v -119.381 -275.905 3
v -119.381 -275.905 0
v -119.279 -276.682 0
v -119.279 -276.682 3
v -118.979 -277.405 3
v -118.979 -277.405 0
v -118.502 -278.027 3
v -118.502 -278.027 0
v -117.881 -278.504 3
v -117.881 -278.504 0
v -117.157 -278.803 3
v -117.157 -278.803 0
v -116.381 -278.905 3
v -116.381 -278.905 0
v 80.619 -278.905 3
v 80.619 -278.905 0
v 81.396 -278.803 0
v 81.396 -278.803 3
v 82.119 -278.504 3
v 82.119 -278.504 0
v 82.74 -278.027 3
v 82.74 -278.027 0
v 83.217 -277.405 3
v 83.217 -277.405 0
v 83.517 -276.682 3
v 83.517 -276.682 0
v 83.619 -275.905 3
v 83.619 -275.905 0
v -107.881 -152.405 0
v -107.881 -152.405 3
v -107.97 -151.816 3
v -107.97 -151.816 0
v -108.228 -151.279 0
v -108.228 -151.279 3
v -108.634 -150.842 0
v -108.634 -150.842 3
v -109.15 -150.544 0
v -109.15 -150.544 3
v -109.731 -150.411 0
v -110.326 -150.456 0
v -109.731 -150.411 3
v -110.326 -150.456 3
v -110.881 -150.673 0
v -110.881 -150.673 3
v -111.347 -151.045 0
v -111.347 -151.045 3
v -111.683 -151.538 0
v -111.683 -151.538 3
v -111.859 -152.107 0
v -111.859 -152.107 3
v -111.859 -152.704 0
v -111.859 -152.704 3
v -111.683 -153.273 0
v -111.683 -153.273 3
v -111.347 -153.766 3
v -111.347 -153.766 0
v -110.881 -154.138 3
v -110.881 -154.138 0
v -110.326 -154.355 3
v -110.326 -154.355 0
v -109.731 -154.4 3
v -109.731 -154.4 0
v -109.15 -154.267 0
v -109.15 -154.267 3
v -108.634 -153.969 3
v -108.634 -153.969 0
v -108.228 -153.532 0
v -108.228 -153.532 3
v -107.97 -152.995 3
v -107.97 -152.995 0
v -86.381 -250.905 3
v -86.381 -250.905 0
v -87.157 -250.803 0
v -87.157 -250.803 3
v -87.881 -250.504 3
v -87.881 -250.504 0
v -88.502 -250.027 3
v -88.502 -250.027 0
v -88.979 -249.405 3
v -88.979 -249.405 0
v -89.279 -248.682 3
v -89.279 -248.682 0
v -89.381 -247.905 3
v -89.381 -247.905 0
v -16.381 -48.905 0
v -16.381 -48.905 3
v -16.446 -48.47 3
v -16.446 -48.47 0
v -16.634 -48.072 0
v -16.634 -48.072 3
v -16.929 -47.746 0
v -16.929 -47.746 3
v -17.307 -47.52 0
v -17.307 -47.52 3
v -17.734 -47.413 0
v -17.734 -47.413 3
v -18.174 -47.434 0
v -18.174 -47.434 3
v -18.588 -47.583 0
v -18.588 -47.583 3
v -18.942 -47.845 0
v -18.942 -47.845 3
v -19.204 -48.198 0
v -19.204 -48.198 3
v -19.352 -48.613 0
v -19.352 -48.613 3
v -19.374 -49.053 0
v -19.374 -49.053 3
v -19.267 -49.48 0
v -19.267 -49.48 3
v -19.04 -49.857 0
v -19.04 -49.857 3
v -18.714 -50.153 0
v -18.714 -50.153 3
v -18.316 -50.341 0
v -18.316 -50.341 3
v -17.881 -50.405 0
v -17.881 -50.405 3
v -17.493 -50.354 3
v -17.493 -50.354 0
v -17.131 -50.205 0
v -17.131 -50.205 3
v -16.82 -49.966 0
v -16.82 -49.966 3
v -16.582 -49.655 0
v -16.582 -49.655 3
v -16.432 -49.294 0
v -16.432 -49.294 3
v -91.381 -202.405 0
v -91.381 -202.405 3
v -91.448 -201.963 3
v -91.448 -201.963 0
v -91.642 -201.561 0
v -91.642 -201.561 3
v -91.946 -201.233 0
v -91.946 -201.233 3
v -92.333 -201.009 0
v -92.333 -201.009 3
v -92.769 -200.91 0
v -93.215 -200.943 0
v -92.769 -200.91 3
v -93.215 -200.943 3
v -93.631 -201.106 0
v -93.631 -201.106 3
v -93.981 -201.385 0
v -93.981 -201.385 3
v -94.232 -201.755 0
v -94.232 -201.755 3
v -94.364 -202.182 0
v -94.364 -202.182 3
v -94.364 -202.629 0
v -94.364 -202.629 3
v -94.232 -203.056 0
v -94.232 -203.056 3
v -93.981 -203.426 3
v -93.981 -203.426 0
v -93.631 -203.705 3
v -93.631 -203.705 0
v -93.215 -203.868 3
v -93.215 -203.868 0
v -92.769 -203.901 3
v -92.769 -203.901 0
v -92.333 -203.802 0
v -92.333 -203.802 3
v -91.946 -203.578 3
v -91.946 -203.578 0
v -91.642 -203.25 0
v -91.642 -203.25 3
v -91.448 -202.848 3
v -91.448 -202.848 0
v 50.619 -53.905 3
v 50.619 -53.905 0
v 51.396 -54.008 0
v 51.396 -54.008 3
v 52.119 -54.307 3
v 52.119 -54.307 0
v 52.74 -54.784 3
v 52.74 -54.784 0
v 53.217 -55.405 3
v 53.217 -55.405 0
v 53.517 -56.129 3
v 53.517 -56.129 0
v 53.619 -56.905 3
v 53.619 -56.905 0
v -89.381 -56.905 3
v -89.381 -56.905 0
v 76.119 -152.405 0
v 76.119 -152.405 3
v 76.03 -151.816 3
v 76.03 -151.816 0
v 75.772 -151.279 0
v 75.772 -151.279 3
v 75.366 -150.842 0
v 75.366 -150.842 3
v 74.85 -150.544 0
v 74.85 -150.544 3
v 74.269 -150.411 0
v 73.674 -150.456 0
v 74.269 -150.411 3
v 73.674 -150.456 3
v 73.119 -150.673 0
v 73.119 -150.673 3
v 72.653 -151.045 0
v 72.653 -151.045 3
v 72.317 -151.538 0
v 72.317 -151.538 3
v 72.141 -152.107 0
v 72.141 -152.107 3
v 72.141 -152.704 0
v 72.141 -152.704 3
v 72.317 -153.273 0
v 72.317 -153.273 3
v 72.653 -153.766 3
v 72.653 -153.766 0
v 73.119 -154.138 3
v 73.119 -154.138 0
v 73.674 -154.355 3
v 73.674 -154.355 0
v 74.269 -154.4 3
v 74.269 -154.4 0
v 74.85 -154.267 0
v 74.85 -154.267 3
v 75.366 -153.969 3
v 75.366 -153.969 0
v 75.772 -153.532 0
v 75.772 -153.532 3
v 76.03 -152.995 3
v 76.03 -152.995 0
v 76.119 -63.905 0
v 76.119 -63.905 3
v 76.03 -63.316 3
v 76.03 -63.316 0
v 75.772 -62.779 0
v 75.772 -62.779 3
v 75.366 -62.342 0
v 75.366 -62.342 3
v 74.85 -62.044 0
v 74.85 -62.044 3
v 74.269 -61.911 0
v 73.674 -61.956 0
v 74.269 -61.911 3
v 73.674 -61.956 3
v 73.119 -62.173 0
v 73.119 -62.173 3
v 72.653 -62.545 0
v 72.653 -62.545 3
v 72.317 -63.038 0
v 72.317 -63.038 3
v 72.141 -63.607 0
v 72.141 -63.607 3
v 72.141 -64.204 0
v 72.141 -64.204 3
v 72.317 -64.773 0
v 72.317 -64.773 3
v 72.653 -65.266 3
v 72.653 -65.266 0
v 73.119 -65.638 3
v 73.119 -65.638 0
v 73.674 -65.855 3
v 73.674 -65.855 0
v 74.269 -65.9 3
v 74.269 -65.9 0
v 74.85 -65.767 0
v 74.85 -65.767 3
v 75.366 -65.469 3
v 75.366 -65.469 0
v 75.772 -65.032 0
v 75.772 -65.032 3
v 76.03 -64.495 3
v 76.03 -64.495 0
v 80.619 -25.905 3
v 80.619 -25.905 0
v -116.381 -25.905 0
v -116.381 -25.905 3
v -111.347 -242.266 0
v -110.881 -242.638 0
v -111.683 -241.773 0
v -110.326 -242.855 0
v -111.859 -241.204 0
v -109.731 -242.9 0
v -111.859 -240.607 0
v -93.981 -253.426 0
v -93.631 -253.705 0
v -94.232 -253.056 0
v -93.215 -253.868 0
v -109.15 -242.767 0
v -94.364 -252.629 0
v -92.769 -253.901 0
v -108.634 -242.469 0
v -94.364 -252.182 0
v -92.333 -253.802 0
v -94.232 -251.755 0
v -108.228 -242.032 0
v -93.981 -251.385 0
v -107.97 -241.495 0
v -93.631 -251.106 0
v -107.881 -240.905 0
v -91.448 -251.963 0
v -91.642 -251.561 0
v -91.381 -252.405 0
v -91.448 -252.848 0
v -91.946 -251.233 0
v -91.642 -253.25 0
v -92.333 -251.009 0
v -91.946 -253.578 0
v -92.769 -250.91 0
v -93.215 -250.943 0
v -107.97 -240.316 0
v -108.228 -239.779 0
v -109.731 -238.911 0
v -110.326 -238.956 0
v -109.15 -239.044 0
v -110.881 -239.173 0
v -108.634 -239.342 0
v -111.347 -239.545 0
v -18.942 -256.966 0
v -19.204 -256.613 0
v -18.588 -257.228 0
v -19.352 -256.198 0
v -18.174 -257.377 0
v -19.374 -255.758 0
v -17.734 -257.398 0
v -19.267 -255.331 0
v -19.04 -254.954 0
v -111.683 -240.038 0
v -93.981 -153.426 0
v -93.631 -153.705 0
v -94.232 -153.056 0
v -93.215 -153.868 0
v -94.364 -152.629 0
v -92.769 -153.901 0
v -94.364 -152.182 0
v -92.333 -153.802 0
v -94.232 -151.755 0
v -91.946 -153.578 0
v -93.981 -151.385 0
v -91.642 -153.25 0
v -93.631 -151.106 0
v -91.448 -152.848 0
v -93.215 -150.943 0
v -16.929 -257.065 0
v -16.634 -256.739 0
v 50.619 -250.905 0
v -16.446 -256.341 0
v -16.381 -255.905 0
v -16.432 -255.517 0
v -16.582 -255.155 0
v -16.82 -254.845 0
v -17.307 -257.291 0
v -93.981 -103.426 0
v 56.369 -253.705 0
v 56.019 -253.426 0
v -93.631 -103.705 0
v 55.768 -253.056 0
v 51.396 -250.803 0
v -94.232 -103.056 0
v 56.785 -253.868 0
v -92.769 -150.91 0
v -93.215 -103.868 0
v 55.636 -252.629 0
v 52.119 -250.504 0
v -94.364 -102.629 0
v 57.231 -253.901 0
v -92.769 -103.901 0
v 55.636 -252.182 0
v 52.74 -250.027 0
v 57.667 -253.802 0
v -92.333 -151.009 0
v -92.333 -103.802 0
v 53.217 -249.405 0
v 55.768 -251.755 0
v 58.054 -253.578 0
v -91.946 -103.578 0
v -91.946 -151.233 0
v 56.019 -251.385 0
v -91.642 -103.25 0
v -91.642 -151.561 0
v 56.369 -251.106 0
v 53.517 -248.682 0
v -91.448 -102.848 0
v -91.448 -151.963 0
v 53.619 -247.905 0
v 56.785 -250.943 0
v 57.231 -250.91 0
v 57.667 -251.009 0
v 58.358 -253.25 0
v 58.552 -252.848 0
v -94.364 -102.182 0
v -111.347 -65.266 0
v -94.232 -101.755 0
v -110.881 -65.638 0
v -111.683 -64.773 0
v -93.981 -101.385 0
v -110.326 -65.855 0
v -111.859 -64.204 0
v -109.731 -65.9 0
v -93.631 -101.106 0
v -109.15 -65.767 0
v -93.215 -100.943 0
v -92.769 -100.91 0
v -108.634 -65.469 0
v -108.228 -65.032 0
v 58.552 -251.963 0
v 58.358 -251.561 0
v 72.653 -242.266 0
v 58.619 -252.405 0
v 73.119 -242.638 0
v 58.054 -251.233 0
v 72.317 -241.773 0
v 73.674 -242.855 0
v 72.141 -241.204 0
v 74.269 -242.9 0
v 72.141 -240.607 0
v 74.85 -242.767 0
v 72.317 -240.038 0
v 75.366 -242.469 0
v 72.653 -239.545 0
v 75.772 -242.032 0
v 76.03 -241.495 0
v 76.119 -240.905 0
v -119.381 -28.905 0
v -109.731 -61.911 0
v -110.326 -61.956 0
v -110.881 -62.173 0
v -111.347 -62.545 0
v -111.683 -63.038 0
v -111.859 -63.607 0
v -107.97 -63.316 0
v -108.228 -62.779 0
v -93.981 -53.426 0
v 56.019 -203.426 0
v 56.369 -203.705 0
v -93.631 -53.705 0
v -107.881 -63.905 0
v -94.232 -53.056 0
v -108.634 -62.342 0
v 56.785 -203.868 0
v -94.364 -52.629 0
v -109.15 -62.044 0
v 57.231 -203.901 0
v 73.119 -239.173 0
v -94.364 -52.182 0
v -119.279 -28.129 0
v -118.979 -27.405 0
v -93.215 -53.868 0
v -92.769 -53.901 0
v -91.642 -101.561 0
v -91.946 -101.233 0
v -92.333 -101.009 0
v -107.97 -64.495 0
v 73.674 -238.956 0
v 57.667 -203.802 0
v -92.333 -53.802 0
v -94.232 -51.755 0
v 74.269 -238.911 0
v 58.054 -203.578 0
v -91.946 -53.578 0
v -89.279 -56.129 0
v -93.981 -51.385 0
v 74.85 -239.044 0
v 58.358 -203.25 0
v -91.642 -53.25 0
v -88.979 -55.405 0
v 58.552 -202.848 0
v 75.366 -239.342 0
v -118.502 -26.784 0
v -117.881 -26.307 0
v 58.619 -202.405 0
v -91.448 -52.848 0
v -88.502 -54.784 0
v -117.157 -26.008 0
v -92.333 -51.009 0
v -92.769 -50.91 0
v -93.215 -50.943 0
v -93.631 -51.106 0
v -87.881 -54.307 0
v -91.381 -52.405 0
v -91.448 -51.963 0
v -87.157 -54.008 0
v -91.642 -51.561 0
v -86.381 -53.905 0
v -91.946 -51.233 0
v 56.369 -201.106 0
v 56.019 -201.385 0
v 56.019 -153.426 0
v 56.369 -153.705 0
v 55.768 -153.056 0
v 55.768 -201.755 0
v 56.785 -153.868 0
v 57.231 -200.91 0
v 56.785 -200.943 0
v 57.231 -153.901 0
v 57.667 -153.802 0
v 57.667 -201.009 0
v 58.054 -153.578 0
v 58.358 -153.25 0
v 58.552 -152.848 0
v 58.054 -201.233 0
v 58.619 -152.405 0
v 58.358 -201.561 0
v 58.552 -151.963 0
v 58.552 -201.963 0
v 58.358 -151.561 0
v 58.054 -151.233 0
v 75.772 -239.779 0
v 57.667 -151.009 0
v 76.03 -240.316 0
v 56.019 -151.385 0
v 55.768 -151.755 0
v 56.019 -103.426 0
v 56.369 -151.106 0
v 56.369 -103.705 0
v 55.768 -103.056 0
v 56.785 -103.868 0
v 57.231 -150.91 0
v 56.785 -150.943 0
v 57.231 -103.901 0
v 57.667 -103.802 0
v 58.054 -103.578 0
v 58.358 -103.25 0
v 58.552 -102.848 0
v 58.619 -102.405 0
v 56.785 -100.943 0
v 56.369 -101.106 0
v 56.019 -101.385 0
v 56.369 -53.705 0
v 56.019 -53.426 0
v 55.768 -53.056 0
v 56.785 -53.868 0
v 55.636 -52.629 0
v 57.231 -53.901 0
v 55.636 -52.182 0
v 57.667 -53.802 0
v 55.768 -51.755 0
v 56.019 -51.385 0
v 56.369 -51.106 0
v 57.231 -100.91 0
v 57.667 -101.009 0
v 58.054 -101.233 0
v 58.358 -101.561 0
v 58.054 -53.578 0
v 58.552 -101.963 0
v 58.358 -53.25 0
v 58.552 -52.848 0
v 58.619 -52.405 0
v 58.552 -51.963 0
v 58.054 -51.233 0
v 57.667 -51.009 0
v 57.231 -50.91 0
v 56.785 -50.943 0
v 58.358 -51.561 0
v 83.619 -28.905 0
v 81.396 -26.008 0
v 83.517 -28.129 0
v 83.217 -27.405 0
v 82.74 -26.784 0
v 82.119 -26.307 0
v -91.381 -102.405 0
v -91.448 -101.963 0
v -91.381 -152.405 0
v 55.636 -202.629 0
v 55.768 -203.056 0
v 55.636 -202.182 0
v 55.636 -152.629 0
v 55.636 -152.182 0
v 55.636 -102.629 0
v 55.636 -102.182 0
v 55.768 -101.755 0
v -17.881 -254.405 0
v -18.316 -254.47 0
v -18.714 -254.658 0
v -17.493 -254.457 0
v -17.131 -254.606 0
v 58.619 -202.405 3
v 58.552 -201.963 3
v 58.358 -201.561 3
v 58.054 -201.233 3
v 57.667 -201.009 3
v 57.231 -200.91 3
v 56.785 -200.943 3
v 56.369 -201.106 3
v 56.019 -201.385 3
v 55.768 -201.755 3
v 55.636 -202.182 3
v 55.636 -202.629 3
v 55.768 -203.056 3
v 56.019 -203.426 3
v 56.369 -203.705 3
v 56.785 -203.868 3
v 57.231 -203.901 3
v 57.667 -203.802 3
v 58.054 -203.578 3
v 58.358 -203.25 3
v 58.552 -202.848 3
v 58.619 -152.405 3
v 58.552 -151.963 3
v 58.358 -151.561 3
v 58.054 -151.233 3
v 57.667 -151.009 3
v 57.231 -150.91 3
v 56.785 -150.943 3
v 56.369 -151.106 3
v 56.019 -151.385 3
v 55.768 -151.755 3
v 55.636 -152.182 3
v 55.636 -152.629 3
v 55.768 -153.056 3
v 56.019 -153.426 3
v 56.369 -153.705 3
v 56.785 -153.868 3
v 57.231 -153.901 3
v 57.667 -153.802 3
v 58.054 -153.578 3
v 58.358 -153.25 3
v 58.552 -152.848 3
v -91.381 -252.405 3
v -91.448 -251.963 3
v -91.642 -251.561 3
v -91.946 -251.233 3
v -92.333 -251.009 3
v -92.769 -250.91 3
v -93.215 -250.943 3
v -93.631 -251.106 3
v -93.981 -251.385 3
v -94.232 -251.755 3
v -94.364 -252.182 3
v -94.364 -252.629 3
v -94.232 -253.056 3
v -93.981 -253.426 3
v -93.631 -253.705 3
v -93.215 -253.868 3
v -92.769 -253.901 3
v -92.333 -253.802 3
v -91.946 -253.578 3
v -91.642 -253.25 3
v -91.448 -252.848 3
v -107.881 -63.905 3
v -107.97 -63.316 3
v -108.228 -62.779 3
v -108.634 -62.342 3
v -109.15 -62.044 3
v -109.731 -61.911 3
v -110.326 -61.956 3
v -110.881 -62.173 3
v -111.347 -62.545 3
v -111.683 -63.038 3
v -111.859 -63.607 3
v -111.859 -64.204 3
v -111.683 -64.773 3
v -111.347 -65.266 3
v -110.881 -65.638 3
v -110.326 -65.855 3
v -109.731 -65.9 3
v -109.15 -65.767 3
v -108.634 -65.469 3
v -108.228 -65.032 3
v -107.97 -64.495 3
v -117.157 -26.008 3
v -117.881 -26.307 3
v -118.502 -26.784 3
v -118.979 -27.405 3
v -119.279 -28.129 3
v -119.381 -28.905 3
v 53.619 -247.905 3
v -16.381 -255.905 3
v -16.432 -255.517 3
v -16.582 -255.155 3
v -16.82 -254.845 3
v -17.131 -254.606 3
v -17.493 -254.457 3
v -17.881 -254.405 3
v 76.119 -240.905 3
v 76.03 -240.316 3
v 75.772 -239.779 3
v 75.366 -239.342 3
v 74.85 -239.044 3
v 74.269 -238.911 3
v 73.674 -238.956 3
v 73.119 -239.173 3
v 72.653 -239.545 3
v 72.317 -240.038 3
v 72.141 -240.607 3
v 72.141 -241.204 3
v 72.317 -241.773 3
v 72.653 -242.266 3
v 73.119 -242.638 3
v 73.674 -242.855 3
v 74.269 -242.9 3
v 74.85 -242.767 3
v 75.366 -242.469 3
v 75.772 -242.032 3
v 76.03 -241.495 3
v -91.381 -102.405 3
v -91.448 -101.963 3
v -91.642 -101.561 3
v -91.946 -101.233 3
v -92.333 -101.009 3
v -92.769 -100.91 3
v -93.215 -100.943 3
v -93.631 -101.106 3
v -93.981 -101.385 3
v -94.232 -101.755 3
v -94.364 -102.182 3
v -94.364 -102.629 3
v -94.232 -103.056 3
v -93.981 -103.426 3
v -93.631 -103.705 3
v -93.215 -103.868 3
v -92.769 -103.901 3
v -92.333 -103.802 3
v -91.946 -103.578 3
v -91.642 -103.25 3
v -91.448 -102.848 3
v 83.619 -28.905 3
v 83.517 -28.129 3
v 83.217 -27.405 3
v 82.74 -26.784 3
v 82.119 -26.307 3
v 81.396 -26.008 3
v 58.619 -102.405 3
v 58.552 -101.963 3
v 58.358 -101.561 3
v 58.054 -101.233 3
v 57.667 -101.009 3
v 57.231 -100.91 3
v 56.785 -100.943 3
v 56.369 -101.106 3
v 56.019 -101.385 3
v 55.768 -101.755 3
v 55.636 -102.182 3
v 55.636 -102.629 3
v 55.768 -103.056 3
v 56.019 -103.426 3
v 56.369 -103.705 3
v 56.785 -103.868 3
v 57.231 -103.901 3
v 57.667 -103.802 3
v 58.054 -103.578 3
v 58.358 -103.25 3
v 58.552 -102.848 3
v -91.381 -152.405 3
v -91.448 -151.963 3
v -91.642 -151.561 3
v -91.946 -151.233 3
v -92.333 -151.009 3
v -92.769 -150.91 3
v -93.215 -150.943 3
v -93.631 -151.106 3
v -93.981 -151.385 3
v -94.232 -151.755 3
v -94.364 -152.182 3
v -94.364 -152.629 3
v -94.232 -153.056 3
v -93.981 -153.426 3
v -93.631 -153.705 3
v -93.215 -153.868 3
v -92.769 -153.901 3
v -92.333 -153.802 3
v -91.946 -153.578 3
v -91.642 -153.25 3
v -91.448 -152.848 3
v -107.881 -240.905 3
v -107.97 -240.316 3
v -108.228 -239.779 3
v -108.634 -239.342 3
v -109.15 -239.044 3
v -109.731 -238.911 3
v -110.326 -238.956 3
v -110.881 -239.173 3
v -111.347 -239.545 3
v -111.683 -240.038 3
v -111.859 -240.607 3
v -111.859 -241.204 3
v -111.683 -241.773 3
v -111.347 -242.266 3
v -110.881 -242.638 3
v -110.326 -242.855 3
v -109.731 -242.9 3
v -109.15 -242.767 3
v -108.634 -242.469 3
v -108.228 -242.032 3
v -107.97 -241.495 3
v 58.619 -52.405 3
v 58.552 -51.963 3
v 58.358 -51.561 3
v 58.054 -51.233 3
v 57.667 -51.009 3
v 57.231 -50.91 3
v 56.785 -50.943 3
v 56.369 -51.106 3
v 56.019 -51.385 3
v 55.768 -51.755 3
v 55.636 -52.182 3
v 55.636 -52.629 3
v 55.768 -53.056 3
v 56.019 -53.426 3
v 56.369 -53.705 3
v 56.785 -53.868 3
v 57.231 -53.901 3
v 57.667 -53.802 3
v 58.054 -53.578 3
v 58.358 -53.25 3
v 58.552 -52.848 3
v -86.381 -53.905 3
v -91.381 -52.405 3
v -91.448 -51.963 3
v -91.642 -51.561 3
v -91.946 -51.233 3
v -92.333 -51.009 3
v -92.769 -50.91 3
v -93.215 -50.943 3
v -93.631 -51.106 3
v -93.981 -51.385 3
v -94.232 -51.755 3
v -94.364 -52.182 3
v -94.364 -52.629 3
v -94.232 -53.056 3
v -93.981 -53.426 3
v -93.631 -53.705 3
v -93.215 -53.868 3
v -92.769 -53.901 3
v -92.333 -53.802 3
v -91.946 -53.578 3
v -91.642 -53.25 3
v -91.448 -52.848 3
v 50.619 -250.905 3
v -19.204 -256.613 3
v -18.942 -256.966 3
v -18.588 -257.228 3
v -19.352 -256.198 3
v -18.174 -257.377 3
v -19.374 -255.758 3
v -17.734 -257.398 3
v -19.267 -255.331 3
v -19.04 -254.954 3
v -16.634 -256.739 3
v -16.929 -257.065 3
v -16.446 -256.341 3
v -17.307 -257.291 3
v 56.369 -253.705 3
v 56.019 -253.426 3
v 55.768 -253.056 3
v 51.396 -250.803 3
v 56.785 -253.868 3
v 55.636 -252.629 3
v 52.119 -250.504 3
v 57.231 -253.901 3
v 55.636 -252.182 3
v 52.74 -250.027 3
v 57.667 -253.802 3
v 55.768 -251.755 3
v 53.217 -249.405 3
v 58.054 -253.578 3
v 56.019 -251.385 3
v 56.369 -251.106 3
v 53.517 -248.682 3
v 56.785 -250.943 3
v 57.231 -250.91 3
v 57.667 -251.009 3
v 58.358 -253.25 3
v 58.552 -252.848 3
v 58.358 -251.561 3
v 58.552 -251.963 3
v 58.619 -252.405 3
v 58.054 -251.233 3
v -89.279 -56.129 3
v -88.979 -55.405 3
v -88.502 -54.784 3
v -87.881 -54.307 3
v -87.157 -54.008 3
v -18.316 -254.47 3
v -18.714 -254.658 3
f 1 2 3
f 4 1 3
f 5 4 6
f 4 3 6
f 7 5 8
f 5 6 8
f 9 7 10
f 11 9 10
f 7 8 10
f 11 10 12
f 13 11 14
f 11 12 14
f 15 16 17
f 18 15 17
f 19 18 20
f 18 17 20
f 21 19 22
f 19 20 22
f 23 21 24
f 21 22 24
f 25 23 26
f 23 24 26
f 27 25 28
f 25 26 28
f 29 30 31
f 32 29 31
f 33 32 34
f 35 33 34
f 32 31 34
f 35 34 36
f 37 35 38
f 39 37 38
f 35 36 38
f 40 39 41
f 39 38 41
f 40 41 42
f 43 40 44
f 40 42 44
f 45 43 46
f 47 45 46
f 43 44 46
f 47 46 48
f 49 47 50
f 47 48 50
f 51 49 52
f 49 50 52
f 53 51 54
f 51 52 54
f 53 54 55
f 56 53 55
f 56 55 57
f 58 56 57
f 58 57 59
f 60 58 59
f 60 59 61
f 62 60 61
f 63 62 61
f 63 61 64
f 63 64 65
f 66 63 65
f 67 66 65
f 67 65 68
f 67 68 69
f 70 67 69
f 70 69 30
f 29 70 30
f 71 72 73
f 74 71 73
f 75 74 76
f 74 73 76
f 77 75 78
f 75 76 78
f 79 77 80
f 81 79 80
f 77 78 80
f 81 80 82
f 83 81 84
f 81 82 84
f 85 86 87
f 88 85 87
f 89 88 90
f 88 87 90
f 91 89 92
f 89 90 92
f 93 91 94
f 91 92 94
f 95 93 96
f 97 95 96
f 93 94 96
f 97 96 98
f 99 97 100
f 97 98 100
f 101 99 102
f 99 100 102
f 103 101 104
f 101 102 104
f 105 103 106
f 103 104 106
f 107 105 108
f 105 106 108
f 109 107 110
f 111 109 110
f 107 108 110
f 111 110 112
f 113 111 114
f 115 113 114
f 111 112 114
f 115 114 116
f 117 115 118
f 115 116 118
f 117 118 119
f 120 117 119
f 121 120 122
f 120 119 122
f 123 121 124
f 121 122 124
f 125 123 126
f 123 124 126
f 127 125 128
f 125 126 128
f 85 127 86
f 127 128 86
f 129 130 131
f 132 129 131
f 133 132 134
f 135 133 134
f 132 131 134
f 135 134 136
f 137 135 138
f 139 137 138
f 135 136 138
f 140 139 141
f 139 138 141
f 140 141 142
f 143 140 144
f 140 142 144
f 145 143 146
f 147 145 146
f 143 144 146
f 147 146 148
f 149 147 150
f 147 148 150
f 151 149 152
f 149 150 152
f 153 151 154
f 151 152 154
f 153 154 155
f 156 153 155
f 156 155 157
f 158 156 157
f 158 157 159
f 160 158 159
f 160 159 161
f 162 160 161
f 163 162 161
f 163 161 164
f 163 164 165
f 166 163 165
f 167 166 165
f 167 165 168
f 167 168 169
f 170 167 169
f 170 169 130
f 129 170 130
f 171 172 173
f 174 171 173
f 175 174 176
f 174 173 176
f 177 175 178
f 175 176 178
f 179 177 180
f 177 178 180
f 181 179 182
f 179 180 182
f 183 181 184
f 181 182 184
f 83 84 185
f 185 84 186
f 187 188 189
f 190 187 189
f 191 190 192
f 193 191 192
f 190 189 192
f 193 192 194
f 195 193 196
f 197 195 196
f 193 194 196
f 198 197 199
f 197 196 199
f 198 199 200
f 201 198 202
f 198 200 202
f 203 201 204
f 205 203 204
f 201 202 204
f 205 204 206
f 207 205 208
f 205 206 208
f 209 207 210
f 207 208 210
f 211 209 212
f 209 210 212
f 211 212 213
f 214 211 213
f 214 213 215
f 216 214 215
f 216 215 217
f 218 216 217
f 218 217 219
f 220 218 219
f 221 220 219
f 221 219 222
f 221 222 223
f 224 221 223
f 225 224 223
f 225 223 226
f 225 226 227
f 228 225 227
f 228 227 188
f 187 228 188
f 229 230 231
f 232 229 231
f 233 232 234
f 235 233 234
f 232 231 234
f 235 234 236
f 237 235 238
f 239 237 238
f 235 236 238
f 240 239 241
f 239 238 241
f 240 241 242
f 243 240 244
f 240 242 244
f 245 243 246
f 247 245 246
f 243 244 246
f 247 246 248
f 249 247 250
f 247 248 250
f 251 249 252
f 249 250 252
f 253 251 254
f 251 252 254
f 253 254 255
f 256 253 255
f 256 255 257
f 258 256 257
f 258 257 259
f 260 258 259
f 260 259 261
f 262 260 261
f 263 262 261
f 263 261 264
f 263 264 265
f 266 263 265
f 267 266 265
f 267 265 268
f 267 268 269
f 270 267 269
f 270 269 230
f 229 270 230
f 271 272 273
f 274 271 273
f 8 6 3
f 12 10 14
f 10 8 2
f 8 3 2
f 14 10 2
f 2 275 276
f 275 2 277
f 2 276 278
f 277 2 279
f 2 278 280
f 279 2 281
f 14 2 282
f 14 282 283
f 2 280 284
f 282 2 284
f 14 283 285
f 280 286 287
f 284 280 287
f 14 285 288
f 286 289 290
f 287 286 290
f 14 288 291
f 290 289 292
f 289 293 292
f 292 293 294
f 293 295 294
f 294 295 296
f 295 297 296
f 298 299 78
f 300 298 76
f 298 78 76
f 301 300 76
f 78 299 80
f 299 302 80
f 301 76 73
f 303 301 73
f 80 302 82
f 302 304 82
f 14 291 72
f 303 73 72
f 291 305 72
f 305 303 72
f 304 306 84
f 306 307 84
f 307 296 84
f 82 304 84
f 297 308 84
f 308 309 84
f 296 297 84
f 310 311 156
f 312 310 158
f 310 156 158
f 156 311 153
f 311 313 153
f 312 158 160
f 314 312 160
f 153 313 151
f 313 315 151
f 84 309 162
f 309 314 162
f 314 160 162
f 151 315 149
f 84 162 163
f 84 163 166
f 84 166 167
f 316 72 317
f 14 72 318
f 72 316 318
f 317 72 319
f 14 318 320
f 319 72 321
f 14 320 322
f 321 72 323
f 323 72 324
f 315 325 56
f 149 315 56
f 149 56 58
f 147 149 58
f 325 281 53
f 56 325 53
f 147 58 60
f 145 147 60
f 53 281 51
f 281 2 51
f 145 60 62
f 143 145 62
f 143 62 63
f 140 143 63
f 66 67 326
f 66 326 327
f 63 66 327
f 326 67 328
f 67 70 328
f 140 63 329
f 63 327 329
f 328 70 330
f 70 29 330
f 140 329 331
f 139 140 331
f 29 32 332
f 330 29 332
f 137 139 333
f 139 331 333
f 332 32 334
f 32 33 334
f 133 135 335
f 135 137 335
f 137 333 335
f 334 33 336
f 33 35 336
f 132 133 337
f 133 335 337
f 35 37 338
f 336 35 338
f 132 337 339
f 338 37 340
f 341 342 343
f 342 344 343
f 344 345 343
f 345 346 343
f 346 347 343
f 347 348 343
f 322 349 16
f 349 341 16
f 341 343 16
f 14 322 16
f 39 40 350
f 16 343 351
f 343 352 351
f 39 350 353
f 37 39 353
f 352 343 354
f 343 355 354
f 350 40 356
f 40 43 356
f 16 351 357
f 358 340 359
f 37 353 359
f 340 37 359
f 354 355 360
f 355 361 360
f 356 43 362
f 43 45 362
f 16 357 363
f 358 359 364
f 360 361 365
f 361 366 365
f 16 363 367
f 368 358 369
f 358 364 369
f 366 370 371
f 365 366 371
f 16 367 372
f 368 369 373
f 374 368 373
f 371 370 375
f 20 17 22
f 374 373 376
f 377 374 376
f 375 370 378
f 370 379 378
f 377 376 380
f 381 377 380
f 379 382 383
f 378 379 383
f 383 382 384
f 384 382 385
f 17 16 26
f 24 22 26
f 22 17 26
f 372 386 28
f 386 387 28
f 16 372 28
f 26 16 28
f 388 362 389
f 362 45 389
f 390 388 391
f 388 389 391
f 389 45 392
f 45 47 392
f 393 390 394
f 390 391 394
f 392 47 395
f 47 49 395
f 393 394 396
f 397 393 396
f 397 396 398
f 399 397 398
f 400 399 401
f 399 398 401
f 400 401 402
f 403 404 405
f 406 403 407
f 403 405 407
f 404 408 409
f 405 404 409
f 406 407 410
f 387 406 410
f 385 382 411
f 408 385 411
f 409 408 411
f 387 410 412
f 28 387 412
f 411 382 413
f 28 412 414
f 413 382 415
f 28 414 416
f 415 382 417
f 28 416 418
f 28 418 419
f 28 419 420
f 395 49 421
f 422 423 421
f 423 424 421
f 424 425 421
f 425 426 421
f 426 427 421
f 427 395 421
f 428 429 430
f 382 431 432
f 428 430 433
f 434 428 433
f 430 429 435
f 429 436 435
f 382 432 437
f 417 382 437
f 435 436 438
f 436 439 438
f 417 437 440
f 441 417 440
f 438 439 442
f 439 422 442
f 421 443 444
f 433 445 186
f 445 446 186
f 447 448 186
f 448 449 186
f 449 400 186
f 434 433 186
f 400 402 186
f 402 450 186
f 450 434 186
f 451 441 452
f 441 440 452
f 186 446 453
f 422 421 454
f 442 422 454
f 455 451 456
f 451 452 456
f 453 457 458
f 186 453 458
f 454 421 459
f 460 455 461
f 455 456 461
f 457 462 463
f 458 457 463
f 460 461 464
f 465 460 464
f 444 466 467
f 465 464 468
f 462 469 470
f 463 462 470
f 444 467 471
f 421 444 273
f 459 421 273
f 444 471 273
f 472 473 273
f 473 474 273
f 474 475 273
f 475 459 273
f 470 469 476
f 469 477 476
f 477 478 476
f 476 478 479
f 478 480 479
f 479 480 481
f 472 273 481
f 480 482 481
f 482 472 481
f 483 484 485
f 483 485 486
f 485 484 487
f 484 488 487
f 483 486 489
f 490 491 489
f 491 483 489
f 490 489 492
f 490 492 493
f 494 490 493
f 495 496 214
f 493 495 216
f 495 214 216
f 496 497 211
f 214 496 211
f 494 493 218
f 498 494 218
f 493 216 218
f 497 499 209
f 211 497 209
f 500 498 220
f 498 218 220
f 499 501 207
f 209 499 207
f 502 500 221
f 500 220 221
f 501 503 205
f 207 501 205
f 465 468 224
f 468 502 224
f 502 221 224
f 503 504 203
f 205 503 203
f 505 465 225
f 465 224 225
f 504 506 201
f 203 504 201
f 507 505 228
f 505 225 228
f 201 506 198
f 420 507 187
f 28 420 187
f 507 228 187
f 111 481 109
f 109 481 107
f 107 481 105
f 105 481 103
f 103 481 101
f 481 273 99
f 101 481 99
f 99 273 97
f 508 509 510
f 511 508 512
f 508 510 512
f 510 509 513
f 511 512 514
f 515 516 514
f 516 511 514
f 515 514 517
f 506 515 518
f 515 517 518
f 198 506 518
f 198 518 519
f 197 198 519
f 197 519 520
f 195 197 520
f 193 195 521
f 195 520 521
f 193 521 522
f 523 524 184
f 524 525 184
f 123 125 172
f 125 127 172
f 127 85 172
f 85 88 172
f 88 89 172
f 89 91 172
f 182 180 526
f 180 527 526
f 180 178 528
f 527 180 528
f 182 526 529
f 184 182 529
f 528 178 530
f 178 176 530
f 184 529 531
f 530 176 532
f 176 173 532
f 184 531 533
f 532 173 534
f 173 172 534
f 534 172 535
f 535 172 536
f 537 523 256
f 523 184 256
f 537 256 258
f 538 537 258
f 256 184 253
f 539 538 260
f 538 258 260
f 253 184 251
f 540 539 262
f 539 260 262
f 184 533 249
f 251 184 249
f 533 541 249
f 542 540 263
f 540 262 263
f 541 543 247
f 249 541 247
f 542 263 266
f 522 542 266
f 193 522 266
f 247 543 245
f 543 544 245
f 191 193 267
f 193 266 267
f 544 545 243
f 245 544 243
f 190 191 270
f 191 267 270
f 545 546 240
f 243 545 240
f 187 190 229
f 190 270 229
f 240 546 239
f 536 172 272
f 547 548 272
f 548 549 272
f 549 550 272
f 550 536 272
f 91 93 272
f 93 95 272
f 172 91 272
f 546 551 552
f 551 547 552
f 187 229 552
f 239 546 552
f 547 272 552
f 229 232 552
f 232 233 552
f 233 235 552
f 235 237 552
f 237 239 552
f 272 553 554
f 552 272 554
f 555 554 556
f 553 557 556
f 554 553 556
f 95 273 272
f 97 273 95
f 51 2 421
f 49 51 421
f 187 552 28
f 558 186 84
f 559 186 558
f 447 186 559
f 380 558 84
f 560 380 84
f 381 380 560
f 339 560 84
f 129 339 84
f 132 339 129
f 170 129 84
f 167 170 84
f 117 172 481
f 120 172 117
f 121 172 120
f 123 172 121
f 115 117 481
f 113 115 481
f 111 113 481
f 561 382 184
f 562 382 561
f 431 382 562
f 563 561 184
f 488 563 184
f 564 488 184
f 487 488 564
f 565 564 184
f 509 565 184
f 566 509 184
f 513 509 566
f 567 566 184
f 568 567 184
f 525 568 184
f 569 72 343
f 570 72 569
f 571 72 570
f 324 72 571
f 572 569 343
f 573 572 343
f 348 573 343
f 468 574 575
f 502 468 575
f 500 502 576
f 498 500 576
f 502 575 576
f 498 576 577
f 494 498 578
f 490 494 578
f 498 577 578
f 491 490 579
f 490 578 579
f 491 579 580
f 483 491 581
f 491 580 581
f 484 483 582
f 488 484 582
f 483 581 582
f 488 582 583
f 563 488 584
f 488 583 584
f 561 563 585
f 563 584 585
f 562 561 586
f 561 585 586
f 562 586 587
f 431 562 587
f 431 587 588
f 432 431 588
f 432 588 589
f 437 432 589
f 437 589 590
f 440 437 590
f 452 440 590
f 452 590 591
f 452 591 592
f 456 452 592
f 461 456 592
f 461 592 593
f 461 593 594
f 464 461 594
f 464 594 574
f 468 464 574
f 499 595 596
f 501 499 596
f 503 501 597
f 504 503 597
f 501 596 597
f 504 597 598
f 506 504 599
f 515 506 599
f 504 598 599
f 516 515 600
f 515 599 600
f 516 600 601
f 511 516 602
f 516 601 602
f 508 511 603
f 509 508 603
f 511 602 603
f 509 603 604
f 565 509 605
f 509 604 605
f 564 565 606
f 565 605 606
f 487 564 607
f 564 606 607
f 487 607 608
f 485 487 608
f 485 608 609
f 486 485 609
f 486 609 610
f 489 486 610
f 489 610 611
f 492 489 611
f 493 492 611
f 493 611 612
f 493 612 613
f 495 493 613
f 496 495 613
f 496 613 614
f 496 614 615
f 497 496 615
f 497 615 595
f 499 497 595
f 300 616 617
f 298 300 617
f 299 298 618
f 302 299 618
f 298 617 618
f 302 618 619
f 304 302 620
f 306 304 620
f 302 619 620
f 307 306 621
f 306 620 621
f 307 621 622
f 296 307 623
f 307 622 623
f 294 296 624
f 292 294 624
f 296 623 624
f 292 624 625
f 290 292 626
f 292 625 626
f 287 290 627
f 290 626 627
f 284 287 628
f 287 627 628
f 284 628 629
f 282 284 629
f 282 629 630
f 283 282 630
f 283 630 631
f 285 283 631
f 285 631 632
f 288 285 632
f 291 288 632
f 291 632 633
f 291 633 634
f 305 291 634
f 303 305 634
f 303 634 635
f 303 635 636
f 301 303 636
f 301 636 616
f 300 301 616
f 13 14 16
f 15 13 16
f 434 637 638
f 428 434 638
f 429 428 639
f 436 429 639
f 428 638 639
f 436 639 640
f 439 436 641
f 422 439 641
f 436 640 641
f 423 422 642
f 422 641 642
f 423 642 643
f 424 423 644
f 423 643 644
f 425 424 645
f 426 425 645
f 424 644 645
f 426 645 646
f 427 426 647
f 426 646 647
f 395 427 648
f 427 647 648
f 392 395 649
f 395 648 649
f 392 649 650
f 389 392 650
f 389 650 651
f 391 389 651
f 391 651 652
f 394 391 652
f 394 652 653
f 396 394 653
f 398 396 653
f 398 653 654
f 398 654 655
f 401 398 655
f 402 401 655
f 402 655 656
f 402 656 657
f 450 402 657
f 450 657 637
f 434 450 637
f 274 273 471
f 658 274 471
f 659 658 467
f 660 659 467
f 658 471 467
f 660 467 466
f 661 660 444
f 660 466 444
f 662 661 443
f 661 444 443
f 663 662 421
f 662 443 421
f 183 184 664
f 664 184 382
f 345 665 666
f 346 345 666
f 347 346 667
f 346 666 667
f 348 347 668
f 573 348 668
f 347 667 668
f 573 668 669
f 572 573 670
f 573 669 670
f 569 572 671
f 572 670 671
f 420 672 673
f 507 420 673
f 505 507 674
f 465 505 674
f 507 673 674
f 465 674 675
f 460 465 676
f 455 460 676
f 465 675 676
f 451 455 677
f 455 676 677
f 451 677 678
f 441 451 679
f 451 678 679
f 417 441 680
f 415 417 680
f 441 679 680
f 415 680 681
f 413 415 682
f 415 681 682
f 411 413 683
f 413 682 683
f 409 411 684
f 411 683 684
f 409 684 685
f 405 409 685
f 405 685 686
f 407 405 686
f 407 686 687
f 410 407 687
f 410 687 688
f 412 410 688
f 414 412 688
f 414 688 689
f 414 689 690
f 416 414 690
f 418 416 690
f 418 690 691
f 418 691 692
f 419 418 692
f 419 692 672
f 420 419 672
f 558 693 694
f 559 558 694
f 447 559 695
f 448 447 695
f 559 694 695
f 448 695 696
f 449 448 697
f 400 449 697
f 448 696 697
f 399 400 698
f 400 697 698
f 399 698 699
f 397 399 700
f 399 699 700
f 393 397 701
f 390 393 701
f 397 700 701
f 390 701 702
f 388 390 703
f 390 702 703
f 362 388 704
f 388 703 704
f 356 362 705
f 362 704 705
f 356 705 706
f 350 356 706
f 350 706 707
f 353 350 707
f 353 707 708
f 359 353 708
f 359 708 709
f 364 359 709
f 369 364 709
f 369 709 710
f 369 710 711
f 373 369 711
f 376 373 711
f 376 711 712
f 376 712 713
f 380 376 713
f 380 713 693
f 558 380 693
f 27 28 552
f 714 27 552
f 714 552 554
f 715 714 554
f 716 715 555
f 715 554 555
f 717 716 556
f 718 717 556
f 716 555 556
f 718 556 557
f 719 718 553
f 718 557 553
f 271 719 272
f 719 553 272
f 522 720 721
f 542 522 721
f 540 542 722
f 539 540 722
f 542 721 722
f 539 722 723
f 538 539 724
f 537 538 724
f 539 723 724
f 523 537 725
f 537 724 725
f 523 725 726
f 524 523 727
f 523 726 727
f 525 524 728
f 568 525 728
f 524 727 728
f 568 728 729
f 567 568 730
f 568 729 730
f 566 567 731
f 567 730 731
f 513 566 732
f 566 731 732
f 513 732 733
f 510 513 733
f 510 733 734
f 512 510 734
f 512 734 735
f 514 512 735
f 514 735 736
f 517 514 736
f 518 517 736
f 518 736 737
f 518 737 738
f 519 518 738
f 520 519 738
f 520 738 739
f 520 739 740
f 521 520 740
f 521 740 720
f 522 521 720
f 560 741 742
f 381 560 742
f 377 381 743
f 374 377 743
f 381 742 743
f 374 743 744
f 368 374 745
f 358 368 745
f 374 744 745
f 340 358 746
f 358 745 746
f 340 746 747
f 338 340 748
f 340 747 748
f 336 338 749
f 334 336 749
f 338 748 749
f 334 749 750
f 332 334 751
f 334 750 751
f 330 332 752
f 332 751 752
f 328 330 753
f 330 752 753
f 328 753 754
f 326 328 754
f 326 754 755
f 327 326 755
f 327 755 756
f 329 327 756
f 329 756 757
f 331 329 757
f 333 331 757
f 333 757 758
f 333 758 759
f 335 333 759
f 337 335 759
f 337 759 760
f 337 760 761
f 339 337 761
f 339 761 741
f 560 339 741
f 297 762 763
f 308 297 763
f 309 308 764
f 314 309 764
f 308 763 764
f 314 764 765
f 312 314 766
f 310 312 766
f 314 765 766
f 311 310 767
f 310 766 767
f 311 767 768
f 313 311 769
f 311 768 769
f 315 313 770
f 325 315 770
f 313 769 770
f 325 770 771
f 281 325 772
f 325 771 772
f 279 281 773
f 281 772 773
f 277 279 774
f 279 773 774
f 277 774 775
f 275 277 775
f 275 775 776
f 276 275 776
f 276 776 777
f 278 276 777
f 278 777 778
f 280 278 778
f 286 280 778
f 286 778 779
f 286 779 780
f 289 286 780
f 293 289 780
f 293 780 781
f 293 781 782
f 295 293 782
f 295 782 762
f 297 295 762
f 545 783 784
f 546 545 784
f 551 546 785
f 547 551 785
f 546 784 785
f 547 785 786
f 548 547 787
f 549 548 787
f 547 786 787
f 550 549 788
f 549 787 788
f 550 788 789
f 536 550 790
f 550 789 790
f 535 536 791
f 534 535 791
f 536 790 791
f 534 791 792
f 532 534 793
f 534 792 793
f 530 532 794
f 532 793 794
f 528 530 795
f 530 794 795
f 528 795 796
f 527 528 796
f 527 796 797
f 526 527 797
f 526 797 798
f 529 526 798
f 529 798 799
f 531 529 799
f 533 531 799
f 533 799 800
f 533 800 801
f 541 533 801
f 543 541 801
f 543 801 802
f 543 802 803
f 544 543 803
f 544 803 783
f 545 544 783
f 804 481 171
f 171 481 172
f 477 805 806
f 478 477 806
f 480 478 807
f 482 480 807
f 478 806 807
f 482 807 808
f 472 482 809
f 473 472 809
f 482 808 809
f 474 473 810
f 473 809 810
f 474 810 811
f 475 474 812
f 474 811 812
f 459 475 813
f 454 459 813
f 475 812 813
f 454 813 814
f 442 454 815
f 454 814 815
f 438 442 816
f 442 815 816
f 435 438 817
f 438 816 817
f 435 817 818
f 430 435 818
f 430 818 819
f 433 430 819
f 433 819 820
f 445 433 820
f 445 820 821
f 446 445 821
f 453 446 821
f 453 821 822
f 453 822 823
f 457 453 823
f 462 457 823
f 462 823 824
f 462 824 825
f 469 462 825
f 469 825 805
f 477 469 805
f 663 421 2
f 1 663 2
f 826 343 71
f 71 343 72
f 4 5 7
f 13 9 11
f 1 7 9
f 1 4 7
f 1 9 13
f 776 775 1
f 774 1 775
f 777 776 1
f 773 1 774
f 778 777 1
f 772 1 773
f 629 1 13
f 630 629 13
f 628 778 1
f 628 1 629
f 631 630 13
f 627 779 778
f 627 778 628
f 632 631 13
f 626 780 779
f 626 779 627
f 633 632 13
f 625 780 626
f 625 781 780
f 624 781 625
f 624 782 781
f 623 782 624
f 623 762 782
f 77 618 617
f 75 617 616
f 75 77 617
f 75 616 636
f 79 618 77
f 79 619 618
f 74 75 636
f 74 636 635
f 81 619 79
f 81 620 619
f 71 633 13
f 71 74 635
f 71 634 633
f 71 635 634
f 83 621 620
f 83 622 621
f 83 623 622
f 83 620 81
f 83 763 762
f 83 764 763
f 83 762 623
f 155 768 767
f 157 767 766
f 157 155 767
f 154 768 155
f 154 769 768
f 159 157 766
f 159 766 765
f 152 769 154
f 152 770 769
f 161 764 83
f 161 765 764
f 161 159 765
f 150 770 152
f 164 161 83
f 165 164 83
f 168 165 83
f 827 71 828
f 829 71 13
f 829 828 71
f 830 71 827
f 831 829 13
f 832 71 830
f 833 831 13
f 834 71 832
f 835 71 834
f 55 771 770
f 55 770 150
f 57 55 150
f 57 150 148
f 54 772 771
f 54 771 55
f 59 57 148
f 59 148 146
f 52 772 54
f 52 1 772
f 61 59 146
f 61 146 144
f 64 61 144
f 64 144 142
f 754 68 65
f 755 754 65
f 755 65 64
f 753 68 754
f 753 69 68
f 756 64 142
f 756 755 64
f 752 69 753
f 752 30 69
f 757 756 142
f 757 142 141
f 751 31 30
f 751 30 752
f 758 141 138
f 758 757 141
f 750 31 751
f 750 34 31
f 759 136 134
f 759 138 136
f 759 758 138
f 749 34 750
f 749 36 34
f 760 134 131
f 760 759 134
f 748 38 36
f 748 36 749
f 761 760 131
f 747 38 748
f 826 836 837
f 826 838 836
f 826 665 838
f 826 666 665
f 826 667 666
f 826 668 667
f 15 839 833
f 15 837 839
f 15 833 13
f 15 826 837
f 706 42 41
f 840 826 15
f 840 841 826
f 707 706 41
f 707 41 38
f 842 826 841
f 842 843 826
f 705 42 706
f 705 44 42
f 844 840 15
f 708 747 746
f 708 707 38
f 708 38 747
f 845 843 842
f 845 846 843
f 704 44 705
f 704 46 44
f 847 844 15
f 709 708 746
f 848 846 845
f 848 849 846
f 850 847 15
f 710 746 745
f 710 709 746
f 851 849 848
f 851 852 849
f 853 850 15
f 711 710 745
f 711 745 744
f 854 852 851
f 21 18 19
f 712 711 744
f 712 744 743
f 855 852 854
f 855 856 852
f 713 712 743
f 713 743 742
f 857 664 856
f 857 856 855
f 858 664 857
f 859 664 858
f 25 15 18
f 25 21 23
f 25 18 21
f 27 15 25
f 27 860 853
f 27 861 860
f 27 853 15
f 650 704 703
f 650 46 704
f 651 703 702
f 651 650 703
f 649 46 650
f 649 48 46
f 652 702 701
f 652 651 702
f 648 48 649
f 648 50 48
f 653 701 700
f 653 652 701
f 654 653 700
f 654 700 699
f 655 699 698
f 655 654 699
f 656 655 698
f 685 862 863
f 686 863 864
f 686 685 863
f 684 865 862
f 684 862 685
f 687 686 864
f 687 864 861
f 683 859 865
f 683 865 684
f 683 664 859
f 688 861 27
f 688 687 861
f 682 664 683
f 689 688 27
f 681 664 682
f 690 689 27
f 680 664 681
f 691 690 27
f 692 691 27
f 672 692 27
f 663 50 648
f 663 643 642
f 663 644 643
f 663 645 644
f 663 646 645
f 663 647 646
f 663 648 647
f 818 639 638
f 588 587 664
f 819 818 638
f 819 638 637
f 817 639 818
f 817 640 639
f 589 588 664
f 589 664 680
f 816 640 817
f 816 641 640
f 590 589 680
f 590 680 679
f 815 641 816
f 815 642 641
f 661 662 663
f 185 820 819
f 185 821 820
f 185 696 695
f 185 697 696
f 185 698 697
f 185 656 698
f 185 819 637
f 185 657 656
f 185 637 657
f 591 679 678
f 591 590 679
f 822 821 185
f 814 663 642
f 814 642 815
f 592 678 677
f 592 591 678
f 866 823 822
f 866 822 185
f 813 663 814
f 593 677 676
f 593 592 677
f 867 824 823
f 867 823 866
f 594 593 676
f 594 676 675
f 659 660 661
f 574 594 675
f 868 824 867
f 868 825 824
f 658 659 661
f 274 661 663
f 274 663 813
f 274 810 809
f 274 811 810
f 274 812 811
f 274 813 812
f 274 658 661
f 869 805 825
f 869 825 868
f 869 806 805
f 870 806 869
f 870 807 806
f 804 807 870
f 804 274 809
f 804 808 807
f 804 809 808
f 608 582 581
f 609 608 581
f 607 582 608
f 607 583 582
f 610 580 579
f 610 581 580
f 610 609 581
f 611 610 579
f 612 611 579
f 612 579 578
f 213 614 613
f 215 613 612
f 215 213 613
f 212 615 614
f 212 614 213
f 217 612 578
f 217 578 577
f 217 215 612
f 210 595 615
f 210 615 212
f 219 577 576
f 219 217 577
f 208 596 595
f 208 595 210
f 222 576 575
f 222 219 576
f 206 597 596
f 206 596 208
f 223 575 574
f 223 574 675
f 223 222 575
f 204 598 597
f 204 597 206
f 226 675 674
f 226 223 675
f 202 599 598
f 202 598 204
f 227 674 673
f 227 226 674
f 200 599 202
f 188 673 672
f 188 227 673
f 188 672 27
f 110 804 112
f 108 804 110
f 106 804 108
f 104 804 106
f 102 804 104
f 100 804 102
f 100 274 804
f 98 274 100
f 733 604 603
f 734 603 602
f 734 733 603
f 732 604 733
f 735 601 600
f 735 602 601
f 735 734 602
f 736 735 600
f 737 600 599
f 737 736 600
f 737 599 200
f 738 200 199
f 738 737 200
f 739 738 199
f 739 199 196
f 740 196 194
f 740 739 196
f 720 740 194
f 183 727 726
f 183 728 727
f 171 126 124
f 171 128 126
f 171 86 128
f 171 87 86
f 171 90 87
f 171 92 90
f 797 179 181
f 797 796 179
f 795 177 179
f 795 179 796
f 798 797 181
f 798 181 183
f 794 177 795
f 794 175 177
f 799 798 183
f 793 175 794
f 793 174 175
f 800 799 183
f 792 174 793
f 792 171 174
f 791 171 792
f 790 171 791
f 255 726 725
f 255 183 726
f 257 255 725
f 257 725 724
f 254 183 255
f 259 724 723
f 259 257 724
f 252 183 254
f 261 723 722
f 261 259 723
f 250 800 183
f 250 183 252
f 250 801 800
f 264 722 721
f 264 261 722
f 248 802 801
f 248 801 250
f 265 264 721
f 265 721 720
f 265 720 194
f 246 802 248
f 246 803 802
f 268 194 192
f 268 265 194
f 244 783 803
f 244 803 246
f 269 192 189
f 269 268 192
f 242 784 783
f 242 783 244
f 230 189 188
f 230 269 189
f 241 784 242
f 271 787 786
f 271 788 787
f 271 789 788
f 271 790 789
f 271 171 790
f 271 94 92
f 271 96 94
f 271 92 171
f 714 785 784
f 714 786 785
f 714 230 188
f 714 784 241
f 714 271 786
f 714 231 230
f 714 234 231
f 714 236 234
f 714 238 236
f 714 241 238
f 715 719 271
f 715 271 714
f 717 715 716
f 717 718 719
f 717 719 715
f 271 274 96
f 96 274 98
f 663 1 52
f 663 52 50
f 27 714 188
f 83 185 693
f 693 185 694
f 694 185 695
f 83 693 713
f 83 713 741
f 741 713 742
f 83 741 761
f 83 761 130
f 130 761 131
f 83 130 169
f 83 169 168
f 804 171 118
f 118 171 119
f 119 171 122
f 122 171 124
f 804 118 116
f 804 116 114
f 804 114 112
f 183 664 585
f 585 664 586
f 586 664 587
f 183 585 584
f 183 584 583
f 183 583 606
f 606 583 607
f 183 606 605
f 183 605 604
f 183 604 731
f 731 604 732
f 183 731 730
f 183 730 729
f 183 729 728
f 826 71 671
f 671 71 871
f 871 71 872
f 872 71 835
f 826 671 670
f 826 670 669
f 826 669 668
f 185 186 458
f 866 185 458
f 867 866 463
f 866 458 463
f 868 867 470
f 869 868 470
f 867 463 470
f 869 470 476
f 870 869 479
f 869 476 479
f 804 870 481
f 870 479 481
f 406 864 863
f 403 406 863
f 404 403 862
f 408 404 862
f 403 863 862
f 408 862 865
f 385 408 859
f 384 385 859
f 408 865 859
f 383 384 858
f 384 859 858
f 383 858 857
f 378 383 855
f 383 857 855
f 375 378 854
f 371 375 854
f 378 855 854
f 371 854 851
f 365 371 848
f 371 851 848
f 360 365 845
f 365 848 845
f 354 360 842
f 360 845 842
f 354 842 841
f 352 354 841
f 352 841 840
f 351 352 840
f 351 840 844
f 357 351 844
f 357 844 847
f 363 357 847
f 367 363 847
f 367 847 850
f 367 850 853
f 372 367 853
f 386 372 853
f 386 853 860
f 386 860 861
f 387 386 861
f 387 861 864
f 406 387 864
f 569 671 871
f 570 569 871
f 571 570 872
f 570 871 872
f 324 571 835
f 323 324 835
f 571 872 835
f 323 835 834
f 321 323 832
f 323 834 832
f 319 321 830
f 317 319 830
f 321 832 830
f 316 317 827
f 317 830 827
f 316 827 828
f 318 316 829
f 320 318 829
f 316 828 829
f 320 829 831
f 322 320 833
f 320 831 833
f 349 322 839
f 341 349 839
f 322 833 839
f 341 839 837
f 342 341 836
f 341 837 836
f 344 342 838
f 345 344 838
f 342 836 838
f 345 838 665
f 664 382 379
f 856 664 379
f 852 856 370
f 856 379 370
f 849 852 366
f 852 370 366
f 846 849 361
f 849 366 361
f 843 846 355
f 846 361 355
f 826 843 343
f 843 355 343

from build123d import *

# Parameters (mm, degrees)
F1_DEPTH = 3
F2_R     = 2
F3_DEPTH = 25
F4_R     = 1.5
F5_DEPTH = 25


with BuildPart() as f1:
    # F0 (on Top) → F1 (new body)
    with BuildSketch(Plane.XY):
        with BuildLine():
            Line((80.619057, -25.905496), (-116.380943, -25.905496))
            ThreePointArc((-116.380943, -25.905496), (-118.502264, -26.784176), (-119.380943, -28.905496))
            Line((-119.380943, -28.905496), (-119.380943, -275.905496))
            ThreePointArc((-119.380943, -275.905496), (-118.502264, -278.026816), (-116.380943, -278.905496))
            Line((-116.380943, -278.905496), (80.619057, -278.905496))
            ThreePointArc((80.619057, -278.905496), (82.740377, -278.026816), (83.619057, -275.905496))
            Line((83.619057, -275.905496), (83.619057, -28.905496))
            ThreePointArc((83.619057, -28.905496), (82.740377, -26.784176), (80.619057, -25.905496))
        make_face()
        with BuildLine():
            ThreePointArc((-89.380943, -56.905496), (-88.502264, -54.784176), (-86.380943, -53.905496))
            Line((-86.380943, -53.905496), (50.619057, -53.905496))
            ThreePointArc((50.619057, -53.905496), (52.740377, -54.784176), (53.619057, -56.905496))
            Line((53.619057, -56.905496), (53.619057, -247.905496))
            ThreePointArc((53.619057, -247.905496), (52.740377, -250.026816), (50.619057, -250.905496))
            Line((50.619057, -250.905496), (-86.380943, -250.905496))
            ThreePointArc((-86.380943, -250.905496), (-88.502264, -250.026816), (-89.380943, -247.905496))
            Line((-89.380943, -247.905496), (-89.380943, -56.905496))
        make_face(mode=Mode.SUBTRACT)
    extrude(amount=F1_DEPTH)

    # F2 (on face) → F3 (cut)
    with BuildSketch(Plane.XY.offset(3)):
        with Locations((-109.880943, -63.905496)):
            Circle(F2_R)
        with Locations((74.119057, -63.905496)):
            Circle(F2_R)
        with Locations((74.119057, -152.405496)):
            Circle(F2_R)
        with Locations((74.119057, -240.905496)):
            Circle(F2_R)
        with Locations((-109.880943, -240.905496)):
            Circle(F2_R)
        with Locations((-109.880943, -152.405496)):
            Circle(F2_R)
    extrude(amount=-F3_DEPTH, mode=Mode.SUBTRACT)

    # F4 (on face) → F5 (cut)
    with BuildSketch(Plane.XY.offset(3)):
        with Locations((-92.880943, -52.405496)):
            Circle(F4_R)
        with BuildLine():
            ThreePointArc((-17.880943, -50.405496), (-16.820283, -49.966156), (-16.380943, -48.905496))
            ThreePointArc((-16.380943, -48.905496), (-18.941603, -47.844836), (-17.880943, -50.405496))
        make_face()
        with Locations((57.119057, -52.405496)):
            Circle(F4_R)
        with Locations((57.119057, -102.405496)):
            Circle(F4_R)
        with Locations((-92.880943, -102.405496)):
            Circle(F4_R)
        with Locations((57.119057, -152.405496)):
            Circle(F4_R)
        with Locations((-92.880943, -152.405496)):
            Circle(F4_R)
        with Locations((-92.880943, -202.405496)):
            Circle(F4_R)
        with Locations((57.119057, -202.405496)):
            Circle(F4_R)
        with Locations((-92.880943, -252.405496)):
            Circle(F4_R)
        with BuildLine():
            ThreePointArc((-17.880943, -254.405496), (-18.941603, -256.966156), (-16.380943, -255.905496))
            ThreePointArc((-16.380943, -255.905496), (-16.820283, -254.844836), (-17.880943, -254.405496))
        make_face()
        with Locations((57.119057, -252.405496)):
            Circle(F4_R)
    extrude(amount=-F5_DEPTH, mode=Mode.SUBTRACT)


solid = f1.part
